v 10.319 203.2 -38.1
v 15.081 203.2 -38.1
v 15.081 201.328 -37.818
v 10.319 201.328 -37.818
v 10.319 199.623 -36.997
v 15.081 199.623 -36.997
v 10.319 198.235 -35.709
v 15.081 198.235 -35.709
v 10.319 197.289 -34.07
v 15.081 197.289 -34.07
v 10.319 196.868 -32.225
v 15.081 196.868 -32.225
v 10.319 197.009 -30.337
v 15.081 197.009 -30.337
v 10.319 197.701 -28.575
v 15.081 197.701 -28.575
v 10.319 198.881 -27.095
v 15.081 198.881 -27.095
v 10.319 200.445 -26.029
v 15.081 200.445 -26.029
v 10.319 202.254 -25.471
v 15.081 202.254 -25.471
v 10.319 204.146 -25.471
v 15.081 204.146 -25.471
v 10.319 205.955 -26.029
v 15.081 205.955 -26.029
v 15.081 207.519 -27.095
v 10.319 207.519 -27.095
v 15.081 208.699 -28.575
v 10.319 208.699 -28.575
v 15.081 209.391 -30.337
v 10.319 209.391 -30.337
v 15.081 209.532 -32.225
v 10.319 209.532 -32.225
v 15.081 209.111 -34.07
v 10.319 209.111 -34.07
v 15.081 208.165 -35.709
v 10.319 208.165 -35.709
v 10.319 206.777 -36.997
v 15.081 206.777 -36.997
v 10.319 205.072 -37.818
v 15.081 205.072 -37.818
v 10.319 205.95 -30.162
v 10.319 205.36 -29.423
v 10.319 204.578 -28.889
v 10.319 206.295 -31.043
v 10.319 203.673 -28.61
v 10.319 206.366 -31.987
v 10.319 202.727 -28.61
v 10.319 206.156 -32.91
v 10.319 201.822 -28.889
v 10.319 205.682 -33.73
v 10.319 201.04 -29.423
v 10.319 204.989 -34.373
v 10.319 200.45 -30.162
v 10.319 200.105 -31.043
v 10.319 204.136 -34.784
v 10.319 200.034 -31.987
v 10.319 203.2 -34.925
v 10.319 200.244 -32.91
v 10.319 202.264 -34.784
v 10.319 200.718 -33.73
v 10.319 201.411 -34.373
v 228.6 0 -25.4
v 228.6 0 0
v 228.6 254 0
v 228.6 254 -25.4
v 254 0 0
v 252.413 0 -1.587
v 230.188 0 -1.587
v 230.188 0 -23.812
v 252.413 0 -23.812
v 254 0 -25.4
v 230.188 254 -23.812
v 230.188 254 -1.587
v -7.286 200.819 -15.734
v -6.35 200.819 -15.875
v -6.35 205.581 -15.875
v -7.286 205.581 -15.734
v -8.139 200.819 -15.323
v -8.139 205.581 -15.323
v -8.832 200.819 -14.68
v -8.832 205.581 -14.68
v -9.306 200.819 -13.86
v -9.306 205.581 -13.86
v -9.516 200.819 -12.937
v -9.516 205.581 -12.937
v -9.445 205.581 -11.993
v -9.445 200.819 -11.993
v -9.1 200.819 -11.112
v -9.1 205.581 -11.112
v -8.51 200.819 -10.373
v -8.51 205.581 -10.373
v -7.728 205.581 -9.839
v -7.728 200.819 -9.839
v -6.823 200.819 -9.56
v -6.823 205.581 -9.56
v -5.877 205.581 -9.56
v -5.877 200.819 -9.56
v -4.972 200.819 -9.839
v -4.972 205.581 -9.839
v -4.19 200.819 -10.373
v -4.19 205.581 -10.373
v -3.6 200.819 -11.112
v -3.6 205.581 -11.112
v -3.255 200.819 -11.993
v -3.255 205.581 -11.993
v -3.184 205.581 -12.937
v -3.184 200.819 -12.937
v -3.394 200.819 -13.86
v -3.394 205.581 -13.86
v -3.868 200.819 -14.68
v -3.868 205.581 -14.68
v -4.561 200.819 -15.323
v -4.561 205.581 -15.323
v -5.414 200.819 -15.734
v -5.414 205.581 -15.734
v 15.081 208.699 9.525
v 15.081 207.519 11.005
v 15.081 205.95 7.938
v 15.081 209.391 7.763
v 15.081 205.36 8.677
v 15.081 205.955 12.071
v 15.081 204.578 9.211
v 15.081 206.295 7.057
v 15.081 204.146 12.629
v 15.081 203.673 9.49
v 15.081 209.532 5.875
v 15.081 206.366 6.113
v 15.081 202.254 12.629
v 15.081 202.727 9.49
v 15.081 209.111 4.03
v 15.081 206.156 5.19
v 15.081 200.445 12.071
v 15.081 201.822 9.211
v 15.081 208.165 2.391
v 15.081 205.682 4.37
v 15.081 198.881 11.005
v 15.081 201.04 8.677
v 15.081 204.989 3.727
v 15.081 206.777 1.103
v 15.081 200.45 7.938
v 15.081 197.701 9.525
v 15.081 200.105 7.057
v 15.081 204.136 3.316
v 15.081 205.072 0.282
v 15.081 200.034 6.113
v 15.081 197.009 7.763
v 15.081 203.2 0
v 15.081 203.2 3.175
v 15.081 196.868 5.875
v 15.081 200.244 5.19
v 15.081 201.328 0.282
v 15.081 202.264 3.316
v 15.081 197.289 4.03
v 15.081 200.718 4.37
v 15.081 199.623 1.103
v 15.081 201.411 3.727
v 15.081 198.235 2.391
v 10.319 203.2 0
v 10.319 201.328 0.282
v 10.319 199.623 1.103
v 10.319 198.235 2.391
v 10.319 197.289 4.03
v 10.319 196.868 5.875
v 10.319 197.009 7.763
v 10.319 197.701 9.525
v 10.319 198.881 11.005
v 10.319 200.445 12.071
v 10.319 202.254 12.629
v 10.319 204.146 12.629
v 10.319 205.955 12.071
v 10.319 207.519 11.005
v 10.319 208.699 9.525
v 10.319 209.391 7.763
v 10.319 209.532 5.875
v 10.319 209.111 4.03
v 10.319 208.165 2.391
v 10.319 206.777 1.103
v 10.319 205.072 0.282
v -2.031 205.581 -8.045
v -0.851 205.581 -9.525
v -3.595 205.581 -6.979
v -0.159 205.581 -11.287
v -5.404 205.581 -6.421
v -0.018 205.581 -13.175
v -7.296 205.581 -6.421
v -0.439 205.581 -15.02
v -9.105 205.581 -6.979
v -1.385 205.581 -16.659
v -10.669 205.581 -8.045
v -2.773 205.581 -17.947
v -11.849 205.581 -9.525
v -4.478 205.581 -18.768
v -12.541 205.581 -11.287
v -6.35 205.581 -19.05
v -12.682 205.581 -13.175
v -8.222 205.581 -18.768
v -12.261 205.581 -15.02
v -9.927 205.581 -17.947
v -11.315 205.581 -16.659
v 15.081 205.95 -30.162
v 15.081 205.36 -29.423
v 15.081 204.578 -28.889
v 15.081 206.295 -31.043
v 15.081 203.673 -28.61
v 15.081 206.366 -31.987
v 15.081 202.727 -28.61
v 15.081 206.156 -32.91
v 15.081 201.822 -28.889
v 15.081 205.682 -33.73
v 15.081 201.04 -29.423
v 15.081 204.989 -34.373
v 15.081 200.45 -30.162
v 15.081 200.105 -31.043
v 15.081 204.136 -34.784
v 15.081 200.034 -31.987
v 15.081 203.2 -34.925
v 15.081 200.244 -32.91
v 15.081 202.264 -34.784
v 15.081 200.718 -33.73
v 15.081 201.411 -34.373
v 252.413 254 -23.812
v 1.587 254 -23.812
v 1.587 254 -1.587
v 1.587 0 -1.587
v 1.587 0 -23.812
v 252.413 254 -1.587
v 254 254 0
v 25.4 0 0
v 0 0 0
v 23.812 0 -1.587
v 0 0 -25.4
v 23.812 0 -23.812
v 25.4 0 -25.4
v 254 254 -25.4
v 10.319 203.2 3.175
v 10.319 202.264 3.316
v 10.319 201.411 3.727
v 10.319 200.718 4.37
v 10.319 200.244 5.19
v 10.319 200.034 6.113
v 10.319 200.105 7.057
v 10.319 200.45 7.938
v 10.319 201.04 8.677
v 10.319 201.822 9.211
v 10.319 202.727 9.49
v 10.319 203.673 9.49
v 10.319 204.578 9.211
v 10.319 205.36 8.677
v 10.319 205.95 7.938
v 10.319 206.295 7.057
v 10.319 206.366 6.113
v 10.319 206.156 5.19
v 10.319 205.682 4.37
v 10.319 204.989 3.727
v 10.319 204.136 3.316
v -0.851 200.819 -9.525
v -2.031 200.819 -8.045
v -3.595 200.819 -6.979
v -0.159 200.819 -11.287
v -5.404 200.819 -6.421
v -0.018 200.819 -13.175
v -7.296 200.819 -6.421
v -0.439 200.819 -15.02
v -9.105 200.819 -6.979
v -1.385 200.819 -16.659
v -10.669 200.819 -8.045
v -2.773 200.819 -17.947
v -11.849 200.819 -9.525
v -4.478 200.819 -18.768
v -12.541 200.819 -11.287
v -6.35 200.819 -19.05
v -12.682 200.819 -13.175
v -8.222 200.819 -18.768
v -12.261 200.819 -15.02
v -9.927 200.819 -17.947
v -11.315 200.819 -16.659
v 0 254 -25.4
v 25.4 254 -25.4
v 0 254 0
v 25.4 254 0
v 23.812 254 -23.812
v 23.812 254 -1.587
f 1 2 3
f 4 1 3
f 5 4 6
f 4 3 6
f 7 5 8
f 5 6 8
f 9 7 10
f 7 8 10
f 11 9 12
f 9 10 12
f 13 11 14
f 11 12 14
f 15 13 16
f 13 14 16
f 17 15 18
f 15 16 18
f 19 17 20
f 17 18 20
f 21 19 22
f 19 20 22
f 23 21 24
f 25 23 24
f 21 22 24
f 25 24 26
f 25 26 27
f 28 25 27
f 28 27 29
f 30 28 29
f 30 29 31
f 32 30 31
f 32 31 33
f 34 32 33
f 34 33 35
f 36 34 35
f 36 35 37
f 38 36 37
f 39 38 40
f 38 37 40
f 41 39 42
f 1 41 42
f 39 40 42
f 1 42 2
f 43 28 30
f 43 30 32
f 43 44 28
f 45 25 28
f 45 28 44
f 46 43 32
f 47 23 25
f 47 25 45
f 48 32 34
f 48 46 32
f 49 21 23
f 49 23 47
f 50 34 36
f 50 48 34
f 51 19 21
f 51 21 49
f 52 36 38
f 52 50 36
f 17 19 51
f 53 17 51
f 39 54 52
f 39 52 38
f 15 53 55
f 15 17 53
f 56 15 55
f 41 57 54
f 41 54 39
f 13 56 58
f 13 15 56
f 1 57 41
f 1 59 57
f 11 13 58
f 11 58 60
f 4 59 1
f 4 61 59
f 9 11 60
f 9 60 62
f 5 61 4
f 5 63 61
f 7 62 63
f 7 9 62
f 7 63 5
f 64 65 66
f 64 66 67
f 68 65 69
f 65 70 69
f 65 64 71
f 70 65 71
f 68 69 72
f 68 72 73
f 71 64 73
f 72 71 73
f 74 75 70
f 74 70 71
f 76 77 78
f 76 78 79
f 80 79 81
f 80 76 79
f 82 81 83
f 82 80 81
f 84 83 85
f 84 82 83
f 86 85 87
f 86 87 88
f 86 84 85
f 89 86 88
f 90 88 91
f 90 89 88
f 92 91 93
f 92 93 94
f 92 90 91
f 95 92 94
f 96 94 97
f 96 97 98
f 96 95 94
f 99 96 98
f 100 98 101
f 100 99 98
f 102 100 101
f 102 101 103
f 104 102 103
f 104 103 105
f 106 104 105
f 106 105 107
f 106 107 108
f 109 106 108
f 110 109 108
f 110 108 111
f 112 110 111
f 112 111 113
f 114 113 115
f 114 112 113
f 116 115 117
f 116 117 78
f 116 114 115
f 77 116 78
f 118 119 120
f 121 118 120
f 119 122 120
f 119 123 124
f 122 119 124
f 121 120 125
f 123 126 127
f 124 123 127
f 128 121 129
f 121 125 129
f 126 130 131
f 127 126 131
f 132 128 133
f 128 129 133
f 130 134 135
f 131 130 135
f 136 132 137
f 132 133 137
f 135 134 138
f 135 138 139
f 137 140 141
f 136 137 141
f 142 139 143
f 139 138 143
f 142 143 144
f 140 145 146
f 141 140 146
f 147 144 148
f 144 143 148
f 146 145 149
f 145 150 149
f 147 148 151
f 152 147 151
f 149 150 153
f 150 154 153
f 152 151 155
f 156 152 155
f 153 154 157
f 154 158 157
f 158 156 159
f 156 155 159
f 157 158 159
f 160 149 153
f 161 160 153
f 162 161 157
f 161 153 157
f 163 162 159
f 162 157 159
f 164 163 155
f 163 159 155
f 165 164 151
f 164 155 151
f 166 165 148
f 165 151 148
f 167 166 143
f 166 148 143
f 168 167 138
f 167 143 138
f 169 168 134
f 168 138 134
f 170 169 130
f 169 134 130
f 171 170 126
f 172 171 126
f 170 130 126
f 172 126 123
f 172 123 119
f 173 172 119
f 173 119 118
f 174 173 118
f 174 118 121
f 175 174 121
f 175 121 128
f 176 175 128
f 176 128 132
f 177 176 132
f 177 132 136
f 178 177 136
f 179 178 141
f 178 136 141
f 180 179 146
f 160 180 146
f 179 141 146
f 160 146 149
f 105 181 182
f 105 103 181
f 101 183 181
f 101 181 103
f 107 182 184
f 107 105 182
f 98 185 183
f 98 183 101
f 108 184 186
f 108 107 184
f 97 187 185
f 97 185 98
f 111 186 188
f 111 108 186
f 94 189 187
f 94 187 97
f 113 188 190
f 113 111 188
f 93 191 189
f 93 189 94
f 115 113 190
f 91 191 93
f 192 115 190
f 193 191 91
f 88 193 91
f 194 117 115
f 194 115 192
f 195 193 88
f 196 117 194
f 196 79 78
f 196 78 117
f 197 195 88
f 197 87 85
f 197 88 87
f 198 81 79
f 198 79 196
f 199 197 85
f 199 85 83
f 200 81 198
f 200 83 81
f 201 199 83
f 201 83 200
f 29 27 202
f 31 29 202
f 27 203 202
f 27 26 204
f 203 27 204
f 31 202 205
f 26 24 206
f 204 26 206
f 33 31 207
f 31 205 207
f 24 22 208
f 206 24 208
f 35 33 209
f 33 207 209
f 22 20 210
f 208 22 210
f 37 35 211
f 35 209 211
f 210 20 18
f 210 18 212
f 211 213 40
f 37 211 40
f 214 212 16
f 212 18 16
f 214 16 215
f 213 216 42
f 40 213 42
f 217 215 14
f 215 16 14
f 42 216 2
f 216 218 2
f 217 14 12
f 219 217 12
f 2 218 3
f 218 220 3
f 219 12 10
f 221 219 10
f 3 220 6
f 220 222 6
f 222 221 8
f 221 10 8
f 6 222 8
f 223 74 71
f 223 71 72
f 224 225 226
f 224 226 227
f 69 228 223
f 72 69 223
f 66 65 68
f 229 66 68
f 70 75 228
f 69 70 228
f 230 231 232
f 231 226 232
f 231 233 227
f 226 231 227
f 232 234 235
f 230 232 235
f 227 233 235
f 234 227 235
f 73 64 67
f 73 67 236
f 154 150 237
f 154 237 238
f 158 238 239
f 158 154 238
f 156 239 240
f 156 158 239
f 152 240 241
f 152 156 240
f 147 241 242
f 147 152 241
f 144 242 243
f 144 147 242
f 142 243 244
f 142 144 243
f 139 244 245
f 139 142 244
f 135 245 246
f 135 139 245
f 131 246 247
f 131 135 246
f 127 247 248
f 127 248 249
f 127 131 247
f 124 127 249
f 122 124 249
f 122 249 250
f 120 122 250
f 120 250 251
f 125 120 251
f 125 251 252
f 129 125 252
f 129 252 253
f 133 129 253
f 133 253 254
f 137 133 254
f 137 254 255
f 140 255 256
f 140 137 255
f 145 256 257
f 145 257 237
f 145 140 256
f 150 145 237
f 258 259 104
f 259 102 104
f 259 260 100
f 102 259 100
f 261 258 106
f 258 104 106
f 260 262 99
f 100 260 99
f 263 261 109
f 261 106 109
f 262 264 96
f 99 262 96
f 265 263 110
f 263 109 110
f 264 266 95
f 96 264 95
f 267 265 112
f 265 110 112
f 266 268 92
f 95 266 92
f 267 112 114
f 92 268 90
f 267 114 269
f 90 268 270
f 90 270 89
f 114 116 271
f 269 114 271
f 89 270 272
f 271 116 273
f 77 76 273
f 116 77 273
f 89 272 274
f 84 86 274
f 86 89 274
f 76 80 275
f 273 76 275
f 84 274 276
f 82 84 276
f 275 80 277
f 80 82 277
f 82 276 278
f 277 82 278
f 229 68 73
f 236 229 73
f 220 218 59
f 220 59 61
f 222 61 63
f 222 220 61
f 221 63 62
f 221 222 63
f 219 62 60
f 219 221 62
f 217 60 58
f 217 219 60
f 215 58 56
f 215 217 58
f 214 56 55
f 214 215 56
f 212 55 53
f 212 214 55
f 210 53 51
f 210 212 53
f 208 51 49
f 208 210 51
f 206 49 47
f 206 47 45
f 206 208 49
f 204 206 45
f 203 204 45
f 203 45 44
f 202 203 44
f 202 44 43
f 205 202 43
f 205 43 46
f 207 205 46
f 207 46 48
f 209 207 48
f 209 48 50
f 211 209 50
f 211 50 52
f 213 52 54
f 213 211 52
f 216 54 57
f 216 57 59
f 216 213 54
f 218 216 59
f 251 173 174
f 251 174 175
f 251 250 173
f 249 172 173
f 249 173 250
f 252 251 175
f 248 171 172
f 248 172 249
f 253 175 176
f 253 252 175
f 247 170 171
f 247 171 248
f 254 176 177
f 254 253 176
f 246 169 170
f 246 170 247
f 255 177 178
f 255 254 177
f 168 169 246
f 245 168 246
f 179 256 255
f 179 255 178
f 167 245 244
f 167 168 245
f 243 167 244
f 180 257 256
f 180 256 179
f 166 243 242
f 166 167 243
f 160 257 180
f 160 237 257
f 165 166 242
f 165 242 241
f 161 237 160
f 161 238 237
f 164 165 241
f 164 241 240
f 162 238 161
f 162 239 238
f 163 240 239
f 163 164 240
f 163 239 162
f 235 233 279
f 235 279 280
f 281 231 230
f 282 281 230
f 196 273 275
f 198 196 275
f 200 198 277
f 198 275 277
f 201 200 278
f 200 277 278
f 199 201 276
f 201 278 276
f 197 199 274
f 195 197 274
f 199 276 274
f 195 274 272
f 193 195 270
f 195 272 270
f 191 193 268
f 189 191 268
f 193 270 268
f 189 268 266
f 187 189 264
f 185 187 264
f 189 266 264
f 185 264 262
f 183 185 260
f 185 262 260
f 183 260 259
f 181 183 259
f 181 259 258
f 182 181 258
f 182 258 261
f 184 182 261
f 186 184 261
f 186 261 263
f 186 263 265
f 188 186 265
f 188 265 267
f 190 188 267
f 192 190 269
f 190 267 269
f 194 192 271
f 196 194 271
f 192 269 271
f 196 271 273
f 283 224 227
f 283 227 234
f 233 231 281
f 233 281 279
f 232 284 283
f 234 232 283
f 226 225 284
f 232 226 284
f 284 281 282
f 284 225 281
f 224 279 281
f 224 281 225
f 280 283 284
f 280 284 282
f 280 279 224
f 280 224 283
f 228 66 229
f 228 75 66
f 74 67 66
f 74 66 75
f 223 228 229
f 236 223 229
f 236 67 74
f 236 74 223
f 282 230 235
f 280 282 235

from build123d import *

# Parameters (mm, degrees)
SKETCH2_W             = 25.4
SKETCH2_H             = 25.4
SKETCH2_W_2           = 22.225
SKETCH2_H_2           = 22.225
BOSS_EXTRUDE1_DEPTH   = 254
BOSS_EXTRUDE1_2_DEPTH = 254
BOSS_EXTRUDE2_START   = -15.08125
SKETCH4_R             = 6.35
SKETCH4_R_2           = 3.175
BOSS_EXTRUDE2_DEPTH   = 4.7625
BOSS_EXTRUDE2_2_DEPTH = 4.7625
BOSS_EXTRUDE3_START   = -53.18125
SKETCH5_R             = 6.35
SKETCH5_R_2           = 3.175
BOSS_EXTRUDE3_DEPTH   = 4.7625


with BuildPart() as part:
    # Sketch2 → Boss-Extrude1 (new body)
    with BuildSketch(Plane(origin=(0, 0, 0), x_dir=(1, 0, 0), z_dir=(0, 1, 0))):
        with Locations((12.7, 12.7)):
            Rectangle(SKETCH2_W, SKETCH2_H)
        with Locations((12.7, 12.7)):
            Rectangle(SKETCH2_W_2, SKETCH2_H_2, mode=Mode.SUBTRACT)
    extrude(amount=BOSS_EXTRUDE1_DEPTH)


with BuildPart() as body_2:
    # Sketch2 → Boss-Extrude1 2 (new body)
    with BuildSketch(Plane(origin=(0, 0, 0), x_dir=(1, 0, 0), z_dir=(0, 1, 0))):
        with Locations((241.3, 12.7)):
            Rectangle(SKETCH2_W, SKETCH2_H)
        with Locations((241.3, 12.7)):
            Rectangle(SKETCH2_W_2, SKETCH2_H_2, mode=Mode.SUBTRACT)
    extrude(amount=BOSS_EXTRUDE1_2_DEPTH)


with BuildPart() as body_3:
    # Sketch4 → Boss-Extrude2 (new body)
    with BuildSketch(Plane.ZY.offset(BOSS_EXTRUDE2_START)):
        with Locations(Location((-31.75, 203.2, 0), (0, 0, 180))):
            Circle(SKETCH4_R)
        with Locations(Location((-31.75, 203.2, 0), (0, 0, 180))):
            Circle(SKETCH4_R_2, mode=Mode.SUBTRACT)
    extrude(amount=BOSS_EXTRUDE2_DEPTH)


with BuildPart() as body_4:
    # Sketch4 → Boss-Extrude2 2 (new body)
    with BuildSketch(Plane.ZY.offset(BOSS_EXTRUDE2_START)):
        with Locations(Location((6.35, 203.2, 0), (0, 0, 180))):
            Circle(SKETCH4_R)
        with Locations(Location((6.35, 203.2, 0), (0, 0, 180))):
            Circle(SKETCH4_R_2, mode=Mode.SUBTRACT)
    extrude(amount=BOSS_EXTRUDE2_2_DEPTH)


with BuildPart() as body_5:
    # Sketch5 → Boss-Extrude3 (new body)
    with BuildSketch(Plane(origin=(0, 254, 0), x_dir=(1, 0, 0), z_dir=(0, 1, 0)).offset(BOSS_EXTRUDE3_START)):
        with Locations(Location((-6.35, 12.7, 0), (0, 0, 90))):
            Circle(SKETCH5_R)
        with Locations(Location((-6.35, 12.7, 0), (0, 0, 90))):
            Circle(SKETCH5_R_2, mode=Mode.SUBTRACT)
    extrude(amount=BOSS_EXTRUDE3_DEPTH)


solid = Compound([part.part, body_2.part, body_3.part, body_4.part, body_5.part])
